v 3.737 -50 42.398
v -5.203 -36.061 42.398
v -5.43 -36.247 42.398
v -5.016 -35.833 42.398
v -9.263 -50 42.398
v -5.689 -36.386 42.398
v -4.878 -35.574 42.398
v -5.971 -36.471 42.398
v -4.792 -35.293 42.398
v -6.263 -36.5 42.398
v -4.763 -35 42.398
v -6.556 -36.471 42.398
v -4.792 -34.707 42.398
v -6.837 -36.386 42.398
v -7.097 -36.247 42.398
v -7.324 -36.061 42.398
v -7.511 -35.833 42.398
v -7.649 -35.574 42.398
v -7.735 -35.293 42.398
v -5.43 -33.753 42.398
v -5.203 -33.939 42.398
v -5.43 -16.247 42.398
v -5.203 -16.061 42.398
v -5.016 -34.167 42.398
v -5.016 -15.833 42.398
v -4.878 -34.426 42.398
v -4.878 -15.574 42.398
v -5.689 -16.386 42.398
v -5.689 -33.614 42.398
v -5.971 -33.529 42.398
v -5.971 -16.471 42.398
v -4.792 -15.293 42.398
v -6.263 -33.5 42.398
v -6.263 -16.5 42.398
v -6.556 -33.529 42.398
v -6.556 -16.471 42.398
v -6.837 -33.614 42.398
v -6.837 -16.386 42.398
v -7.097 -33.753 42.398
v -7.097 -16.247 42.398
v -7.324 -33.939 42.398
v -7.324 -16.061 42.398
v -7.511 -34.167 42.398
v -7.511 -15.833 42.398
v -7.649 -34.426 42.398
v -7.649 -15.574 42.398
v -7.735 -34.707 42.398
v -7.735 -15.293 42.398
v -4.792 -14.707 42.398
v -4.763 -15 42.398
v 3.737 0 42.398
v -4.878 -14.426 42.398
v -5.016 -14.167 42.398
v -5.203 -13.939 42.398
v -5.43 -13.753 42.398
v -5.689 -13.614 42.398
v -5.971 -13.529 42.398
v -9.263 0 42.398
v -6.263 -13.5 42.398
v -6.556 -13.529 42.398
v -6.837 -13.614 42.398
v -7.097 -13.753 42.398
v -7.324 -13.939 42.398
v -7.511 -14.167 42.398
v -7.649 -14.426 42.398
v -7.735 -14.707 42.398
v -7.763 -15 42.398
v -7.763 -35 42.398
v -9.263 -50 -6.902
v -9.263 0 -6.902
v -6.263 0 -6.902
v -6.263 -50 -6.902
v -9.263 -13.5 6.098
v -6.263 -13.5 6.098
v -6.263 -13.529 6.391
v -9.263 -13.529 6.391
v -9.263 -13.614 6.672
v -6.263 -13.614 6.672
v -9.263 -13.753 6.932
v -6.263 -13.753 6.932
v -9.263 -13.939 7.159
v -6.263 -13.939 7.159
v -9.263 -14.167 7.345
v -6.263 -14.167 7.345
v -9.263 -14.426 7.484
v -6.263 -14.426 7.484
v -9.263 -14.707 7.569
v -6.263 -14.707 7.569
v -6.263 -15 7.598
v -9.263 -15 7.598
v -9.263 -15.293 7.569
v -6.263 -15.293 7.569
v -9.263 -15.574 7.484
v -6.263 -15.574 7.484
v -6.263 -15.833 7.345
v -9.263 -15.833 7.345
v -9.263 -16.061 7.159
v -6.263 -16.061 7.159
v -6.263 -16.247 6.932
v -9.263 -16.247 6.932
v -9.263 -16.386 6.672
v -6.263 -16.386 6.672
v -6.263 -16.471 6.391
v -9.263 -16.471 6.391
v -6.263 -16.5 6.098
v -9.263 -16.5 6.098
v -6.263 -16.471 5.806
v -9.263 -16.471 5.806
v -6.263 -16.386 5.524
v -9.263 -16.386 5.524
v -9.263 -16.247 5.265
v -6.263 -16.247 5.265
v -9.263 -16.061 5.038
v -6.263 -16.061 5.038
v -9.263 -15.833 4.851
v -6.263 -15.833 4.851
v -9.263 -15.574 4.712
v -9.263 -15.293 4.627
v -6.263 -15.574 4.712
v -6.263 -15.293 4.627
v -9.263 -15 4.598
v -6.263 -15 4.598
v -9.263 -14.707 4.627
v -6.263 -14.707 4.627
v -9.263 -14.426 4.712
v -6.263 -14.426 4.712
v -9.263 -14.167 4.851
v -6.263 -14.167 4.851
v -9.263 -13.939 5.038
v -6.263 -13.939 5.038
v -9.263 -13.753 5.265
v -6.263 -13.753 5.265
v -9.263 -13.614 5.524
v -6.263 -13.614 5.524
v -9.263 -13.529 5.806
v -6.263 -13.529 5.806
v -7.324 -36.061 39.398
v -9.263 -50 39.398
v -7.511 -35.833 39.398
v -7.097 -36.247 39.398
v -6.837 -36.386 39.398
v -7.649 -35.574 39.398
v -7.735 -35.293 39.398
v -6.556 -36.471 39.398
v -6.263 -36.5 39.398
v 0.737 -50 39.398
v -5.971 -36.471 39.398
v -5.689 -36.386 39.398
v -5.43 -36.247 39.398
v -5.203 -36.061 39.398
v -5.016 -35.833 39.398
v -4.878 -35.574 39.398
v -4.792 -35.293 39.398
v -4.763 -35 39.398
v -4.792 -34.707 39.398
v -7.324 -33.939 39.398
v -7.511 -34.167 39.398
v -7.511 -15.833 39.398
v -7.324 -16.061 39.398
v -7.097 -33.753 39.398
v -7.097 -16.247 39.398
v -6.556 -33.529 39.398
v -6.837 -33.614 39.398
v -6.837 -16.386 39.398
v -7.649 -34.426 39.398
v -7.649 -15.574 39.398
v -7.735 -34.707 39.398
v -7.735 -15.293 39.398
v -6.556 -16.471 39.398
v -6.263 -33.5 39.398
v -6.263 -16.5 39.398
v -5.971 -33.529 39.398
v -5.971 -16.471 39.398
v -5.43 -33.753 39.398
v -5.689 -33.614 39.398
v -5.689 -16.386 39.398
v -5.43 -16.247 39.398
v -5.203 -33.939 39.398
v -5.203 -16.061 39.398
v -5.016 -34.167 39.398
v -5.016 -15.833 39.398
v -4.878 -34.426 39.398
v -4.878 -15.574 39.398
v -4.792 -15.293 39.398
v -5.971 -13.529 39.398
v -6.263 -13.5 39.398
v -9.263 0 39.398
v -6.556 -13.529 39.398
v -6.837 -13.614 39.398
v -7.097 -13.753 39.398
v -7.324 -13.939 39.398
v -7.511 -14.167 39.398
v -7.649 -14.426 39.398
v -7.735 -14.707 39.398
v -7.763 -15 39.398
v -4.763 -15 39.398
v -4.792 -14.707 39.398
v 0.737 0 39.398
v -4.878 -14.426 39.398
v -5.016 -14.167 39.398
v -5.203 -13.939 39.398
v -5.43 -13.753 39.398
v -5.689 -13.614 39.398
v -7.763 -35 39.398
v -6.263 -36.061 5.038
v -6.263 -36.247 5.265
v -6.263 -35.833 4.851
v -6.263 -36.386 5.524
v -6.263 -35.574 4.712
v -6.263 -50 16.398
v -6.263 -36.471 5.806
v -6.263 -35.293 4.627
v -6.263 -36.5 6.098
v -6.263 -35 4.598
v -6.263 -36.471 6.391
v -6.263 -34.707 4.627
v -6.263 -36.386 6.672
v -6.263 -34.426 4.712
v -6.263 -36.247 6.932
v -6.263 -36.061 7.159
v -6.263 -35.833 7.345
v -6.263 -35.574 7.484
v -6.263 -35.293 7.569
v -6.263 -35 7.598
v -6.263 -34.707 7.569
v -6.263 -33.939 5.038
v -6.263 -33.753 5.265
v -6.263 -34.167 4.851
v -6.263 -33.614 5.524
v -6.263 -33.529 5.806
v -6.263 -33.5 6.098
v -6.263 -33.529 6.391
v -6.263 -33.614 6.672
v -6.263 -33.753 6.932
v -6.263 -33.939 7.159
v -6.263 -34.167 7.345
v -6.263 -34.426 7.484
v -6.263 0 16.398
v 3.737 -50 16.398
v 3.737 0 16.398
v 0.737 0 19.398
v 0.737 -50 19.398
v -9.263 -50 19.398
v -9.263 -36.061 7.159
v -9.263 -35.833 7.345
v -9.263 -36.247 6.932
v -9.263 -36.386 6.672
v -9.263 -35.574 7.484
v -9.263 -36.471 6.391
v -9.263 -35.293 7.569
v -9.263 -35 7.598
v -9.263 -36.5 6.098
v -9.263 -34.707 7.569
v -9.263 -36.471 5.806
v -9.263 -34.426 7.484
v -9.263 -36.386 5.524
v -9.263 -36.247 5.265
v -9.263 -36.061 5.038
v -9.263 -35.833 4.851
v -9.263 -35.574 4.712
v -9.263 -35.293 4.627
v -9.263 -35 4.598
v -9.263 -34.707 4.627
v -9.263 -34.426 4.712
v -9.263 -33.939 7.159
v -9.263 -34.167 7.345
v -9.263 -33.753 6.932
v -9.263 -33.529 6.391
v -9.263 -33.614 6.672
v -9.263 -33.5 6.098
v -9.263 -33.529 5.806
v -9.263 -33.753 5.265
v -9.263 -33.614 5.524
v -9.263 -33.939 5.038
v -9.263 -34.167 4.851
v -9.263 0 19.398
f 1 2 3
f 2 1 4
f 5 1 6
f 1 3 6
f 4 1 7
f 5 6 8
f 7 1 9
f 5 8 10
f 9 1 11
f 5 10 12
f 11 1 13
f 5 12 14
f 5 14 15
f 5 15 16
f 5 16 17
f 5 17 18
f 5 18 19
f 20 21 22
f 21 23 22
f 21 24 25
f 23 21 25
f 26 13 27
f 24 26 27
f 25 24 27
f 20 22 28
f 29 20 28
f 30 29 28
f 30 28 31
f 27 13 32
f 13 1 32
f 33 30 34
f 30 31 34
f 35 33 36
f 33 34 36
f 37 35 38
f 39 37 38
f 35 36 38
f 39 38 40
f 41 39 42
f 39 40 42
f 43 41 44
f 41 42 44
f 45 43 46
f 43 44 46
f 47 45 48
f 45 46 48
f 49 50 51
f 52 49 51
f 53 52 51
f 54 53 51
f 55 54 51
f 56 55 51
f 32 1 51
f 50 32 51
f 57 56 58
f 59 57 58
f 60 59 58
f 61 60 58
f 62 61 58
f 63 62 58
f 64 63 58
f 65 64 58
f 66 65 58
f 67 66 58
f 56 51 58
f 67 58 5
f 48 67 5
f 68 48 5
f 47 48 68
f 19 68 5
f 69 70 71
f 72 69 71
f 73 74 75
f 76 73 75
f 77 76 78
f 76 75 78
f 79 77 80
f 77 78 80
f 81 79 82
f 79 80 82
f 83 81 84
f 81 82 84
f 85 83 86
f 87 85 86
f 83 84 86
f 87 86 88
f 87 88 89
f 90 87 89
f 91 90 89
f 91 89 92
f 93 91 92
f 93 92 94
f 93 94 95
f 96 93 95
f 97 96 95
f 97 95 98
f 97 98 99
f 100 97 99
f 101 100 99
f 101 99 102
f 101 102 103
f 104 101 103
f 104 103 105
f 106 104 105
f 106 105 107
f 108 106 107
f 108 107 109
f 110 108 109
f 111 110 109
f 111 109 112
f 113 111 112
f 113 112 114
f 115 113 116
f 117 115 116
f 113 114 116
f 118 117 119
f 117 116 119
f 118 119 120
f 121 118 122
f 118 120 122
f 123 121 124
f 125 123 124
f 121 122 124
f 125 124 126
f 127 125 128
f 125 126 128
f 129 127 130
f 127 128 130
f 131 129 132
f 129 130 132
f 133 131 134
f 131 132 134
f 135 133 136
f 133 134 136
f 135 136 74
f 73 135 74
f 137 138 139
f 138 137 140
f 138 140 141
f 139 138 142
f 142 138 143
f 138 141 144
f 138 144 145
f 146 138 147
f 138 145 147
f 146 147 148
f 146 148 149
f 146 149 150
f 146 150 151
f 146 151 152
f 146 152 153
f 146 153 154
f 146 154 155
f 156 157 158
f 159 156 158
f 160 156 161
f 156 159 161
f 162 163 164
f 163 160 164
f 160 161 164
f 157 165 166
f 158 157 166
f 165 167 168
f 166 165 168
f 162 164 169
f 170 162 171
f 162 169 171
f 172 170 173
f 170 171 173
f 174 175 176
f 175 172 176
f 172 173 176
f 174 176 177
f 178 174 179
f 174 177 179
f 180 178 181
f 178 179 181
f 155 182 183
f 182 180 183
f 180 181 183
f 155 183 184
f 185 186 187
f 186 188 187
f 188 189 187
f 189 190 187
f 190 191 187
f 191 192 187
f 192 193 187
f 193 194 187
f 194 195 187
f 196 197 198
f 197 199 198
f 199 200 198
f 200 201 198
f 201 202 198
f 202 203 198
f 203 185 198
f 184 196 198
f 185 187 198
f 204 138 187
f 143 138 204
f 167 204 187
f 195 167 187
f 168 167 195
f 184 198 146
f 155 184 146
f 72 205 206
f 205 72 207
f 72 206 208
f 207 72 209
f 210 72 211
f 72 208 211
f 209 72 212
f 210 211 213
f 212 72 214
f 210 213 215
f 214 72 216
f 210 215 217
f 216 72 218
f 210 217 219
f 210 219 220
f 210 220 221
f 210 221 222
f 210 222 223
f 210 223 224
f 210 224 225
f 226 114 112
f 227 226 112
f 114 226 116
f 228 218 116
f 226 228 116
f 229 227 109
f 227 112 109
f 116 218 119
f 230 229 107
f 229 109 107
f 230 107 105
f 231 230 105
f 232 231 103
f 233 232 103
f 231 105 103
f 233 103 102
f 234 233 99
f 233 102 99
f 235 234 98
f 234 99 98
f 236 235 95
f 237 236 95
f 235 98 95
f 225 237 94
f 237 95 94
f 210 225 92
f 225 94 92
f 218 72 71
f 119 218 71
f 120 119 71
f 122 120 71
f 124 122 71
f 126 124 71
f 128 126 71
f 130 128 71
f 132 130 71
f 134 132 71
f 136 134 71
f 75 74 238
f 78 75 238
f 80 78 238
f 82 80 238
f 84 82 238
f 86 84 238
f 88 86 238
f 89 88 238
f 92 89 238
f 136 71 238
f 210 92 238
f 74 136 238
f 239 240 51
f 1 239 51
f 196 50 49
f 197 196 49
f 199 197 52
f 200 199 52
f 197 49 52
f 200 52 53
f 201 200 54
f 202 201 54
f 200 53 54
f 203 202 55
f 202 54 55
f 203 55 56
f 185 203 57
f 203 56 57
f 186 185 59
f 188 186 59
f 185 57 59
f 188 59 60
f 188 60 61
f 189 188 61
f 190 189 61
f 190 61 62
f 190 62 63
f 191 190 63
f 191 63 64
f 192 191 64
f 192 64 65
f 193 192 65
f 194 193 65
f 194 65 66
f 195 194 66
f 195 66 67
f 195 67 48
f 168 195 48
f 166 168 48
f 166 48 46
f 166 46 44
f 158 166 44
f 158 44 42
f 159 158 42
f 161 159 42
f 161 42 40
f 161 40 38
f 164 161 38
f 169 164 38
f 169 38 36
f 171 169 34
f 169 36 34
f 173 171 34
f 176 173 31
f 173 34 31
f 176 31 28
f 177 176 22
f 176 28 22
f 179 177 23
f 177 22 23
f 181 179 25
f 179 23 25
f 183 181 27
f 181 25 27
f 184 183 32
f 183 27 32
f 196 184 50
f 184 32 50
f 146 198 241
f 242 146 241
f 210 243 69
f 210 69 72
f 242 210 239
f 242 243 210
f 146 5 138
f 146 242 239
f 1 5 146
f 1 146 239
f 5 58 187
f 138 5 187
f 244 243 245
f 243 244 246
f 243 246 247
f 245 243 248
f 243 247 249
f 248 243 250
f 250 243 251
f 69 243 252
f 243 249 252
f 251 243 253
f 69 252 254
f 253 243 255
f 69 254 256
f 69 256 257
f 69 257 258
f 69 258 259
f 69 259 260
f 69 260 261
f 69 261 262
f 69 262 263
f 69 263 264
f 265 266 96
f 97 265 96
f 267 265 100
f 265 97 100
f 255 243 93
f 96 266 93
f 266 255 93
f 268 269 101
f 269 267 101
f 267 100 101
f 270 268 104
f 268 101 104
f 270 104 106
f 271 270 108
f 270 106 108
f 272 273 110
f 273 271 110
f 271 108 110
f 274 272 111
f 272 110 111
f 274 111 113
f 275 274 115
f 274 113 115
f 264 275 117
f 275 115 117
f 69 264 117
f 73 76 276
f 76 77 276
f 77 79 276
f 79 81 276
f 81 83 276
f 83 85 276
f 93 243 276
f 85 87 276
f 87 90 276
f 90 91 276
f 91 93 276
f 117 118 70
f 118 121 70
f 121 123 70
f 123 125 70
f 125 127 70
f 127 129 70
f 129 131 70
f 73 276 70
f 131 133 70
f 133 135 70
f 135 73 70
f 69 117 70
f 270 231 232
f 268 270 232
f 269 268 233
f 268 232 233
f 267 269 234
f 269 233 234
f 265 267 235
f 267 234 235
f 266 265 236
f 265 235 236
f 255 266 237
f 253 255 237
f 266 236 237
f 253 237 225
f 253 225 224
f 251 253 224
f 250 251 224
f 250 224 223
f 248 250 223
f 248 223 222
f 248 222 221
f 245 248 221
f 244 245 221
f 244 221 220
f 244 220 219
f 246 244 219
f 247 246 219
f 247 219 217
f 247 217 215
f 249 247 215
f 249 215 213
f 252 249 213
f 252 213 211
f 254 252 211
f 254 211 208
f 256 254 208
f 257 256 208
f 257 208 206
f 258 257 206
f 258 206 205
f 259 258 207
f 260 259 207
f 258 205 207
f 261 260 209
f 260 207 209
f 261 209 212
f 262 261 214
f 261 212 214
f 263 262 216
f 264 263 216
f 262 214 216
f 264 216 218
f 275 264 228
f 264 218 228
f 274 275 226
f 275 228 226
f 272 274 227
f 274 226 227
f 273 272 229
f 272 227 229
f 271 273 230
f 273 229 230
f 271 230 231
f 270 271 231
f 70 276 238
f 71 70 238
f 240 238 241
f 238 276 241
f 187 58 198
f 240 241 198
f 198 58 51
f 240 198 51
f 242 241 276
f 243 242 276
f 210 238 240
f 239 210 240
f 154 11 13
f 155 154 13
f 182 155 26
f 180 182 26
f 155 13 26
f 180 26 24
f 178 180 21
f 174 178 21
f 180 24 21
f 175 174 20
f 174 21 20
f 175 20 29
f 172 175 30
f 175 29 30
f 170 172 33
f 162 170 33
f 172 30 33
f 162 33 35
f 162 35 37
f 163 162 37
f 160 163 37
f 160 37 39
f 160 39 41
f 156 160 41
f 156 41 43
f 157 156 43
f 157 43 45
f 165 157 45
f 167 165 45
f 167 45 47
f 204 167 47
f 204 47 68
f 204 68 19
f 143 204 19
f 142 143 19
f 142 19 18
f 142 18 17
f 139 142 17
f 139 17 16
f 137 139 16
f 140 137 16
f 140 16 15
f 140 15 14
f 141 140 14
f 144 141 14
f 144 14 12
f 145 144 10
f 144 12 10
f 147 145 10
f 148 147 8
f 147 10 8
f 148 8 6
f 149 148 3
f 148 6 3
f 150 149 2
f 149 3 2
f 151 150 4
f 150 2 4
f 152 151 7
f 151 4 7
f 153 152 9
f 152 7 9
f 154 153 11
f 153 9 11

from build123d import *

# Parameters (mm, degrees)
F1_DEPTH = 50
F2_R     = 1.5
F3_DEPTH = 10
F4_R     = 1.5
F5_DEPTH = 25


with BuildPart() as f1:
    # F0 (on Front) → F1 (new body)
    with BuildSketch(Plane.XZ):
        Polygon((-9.26335, 42.398173), (-9.26335, 39.398173), (0.73665, 39.398173), (0.73665, 19.398173), (-9.26335, 19.398173), (-9.26335, -6.901827), (-6.26335, -6.901827), (-6.26335, 16.398173), (3.73665, 16.398173), (3.73665, 42.398173), align=None)
    extrude(amount=F1_DEPTH)

    # F2 (on face) → F3 (cut)
    with BuildSketch(Plane.XY.offset(42.398173)):
        with Locations((-6.26335, -35)):
            Circle(F2_R)
        with Locations((-6.26335, -15)):
            Circle(F2_R)
    extrude(amount=-F3_DEPTH, mode=Mode.SUBTRACT)

    # F4 (on face) → F5 (cut)
    with BuildSketch(Plane.YZ.offset(-6.26335)):
        with Locations((-35, 6.098173)):
            Circle(F4_R)
        with Locations((-15, 6.098173)):
            Circle(F4_R)
    extrude(amount=-F5_DEPTH, mode=Mode.SUBTRACT)


solid = f1.part
